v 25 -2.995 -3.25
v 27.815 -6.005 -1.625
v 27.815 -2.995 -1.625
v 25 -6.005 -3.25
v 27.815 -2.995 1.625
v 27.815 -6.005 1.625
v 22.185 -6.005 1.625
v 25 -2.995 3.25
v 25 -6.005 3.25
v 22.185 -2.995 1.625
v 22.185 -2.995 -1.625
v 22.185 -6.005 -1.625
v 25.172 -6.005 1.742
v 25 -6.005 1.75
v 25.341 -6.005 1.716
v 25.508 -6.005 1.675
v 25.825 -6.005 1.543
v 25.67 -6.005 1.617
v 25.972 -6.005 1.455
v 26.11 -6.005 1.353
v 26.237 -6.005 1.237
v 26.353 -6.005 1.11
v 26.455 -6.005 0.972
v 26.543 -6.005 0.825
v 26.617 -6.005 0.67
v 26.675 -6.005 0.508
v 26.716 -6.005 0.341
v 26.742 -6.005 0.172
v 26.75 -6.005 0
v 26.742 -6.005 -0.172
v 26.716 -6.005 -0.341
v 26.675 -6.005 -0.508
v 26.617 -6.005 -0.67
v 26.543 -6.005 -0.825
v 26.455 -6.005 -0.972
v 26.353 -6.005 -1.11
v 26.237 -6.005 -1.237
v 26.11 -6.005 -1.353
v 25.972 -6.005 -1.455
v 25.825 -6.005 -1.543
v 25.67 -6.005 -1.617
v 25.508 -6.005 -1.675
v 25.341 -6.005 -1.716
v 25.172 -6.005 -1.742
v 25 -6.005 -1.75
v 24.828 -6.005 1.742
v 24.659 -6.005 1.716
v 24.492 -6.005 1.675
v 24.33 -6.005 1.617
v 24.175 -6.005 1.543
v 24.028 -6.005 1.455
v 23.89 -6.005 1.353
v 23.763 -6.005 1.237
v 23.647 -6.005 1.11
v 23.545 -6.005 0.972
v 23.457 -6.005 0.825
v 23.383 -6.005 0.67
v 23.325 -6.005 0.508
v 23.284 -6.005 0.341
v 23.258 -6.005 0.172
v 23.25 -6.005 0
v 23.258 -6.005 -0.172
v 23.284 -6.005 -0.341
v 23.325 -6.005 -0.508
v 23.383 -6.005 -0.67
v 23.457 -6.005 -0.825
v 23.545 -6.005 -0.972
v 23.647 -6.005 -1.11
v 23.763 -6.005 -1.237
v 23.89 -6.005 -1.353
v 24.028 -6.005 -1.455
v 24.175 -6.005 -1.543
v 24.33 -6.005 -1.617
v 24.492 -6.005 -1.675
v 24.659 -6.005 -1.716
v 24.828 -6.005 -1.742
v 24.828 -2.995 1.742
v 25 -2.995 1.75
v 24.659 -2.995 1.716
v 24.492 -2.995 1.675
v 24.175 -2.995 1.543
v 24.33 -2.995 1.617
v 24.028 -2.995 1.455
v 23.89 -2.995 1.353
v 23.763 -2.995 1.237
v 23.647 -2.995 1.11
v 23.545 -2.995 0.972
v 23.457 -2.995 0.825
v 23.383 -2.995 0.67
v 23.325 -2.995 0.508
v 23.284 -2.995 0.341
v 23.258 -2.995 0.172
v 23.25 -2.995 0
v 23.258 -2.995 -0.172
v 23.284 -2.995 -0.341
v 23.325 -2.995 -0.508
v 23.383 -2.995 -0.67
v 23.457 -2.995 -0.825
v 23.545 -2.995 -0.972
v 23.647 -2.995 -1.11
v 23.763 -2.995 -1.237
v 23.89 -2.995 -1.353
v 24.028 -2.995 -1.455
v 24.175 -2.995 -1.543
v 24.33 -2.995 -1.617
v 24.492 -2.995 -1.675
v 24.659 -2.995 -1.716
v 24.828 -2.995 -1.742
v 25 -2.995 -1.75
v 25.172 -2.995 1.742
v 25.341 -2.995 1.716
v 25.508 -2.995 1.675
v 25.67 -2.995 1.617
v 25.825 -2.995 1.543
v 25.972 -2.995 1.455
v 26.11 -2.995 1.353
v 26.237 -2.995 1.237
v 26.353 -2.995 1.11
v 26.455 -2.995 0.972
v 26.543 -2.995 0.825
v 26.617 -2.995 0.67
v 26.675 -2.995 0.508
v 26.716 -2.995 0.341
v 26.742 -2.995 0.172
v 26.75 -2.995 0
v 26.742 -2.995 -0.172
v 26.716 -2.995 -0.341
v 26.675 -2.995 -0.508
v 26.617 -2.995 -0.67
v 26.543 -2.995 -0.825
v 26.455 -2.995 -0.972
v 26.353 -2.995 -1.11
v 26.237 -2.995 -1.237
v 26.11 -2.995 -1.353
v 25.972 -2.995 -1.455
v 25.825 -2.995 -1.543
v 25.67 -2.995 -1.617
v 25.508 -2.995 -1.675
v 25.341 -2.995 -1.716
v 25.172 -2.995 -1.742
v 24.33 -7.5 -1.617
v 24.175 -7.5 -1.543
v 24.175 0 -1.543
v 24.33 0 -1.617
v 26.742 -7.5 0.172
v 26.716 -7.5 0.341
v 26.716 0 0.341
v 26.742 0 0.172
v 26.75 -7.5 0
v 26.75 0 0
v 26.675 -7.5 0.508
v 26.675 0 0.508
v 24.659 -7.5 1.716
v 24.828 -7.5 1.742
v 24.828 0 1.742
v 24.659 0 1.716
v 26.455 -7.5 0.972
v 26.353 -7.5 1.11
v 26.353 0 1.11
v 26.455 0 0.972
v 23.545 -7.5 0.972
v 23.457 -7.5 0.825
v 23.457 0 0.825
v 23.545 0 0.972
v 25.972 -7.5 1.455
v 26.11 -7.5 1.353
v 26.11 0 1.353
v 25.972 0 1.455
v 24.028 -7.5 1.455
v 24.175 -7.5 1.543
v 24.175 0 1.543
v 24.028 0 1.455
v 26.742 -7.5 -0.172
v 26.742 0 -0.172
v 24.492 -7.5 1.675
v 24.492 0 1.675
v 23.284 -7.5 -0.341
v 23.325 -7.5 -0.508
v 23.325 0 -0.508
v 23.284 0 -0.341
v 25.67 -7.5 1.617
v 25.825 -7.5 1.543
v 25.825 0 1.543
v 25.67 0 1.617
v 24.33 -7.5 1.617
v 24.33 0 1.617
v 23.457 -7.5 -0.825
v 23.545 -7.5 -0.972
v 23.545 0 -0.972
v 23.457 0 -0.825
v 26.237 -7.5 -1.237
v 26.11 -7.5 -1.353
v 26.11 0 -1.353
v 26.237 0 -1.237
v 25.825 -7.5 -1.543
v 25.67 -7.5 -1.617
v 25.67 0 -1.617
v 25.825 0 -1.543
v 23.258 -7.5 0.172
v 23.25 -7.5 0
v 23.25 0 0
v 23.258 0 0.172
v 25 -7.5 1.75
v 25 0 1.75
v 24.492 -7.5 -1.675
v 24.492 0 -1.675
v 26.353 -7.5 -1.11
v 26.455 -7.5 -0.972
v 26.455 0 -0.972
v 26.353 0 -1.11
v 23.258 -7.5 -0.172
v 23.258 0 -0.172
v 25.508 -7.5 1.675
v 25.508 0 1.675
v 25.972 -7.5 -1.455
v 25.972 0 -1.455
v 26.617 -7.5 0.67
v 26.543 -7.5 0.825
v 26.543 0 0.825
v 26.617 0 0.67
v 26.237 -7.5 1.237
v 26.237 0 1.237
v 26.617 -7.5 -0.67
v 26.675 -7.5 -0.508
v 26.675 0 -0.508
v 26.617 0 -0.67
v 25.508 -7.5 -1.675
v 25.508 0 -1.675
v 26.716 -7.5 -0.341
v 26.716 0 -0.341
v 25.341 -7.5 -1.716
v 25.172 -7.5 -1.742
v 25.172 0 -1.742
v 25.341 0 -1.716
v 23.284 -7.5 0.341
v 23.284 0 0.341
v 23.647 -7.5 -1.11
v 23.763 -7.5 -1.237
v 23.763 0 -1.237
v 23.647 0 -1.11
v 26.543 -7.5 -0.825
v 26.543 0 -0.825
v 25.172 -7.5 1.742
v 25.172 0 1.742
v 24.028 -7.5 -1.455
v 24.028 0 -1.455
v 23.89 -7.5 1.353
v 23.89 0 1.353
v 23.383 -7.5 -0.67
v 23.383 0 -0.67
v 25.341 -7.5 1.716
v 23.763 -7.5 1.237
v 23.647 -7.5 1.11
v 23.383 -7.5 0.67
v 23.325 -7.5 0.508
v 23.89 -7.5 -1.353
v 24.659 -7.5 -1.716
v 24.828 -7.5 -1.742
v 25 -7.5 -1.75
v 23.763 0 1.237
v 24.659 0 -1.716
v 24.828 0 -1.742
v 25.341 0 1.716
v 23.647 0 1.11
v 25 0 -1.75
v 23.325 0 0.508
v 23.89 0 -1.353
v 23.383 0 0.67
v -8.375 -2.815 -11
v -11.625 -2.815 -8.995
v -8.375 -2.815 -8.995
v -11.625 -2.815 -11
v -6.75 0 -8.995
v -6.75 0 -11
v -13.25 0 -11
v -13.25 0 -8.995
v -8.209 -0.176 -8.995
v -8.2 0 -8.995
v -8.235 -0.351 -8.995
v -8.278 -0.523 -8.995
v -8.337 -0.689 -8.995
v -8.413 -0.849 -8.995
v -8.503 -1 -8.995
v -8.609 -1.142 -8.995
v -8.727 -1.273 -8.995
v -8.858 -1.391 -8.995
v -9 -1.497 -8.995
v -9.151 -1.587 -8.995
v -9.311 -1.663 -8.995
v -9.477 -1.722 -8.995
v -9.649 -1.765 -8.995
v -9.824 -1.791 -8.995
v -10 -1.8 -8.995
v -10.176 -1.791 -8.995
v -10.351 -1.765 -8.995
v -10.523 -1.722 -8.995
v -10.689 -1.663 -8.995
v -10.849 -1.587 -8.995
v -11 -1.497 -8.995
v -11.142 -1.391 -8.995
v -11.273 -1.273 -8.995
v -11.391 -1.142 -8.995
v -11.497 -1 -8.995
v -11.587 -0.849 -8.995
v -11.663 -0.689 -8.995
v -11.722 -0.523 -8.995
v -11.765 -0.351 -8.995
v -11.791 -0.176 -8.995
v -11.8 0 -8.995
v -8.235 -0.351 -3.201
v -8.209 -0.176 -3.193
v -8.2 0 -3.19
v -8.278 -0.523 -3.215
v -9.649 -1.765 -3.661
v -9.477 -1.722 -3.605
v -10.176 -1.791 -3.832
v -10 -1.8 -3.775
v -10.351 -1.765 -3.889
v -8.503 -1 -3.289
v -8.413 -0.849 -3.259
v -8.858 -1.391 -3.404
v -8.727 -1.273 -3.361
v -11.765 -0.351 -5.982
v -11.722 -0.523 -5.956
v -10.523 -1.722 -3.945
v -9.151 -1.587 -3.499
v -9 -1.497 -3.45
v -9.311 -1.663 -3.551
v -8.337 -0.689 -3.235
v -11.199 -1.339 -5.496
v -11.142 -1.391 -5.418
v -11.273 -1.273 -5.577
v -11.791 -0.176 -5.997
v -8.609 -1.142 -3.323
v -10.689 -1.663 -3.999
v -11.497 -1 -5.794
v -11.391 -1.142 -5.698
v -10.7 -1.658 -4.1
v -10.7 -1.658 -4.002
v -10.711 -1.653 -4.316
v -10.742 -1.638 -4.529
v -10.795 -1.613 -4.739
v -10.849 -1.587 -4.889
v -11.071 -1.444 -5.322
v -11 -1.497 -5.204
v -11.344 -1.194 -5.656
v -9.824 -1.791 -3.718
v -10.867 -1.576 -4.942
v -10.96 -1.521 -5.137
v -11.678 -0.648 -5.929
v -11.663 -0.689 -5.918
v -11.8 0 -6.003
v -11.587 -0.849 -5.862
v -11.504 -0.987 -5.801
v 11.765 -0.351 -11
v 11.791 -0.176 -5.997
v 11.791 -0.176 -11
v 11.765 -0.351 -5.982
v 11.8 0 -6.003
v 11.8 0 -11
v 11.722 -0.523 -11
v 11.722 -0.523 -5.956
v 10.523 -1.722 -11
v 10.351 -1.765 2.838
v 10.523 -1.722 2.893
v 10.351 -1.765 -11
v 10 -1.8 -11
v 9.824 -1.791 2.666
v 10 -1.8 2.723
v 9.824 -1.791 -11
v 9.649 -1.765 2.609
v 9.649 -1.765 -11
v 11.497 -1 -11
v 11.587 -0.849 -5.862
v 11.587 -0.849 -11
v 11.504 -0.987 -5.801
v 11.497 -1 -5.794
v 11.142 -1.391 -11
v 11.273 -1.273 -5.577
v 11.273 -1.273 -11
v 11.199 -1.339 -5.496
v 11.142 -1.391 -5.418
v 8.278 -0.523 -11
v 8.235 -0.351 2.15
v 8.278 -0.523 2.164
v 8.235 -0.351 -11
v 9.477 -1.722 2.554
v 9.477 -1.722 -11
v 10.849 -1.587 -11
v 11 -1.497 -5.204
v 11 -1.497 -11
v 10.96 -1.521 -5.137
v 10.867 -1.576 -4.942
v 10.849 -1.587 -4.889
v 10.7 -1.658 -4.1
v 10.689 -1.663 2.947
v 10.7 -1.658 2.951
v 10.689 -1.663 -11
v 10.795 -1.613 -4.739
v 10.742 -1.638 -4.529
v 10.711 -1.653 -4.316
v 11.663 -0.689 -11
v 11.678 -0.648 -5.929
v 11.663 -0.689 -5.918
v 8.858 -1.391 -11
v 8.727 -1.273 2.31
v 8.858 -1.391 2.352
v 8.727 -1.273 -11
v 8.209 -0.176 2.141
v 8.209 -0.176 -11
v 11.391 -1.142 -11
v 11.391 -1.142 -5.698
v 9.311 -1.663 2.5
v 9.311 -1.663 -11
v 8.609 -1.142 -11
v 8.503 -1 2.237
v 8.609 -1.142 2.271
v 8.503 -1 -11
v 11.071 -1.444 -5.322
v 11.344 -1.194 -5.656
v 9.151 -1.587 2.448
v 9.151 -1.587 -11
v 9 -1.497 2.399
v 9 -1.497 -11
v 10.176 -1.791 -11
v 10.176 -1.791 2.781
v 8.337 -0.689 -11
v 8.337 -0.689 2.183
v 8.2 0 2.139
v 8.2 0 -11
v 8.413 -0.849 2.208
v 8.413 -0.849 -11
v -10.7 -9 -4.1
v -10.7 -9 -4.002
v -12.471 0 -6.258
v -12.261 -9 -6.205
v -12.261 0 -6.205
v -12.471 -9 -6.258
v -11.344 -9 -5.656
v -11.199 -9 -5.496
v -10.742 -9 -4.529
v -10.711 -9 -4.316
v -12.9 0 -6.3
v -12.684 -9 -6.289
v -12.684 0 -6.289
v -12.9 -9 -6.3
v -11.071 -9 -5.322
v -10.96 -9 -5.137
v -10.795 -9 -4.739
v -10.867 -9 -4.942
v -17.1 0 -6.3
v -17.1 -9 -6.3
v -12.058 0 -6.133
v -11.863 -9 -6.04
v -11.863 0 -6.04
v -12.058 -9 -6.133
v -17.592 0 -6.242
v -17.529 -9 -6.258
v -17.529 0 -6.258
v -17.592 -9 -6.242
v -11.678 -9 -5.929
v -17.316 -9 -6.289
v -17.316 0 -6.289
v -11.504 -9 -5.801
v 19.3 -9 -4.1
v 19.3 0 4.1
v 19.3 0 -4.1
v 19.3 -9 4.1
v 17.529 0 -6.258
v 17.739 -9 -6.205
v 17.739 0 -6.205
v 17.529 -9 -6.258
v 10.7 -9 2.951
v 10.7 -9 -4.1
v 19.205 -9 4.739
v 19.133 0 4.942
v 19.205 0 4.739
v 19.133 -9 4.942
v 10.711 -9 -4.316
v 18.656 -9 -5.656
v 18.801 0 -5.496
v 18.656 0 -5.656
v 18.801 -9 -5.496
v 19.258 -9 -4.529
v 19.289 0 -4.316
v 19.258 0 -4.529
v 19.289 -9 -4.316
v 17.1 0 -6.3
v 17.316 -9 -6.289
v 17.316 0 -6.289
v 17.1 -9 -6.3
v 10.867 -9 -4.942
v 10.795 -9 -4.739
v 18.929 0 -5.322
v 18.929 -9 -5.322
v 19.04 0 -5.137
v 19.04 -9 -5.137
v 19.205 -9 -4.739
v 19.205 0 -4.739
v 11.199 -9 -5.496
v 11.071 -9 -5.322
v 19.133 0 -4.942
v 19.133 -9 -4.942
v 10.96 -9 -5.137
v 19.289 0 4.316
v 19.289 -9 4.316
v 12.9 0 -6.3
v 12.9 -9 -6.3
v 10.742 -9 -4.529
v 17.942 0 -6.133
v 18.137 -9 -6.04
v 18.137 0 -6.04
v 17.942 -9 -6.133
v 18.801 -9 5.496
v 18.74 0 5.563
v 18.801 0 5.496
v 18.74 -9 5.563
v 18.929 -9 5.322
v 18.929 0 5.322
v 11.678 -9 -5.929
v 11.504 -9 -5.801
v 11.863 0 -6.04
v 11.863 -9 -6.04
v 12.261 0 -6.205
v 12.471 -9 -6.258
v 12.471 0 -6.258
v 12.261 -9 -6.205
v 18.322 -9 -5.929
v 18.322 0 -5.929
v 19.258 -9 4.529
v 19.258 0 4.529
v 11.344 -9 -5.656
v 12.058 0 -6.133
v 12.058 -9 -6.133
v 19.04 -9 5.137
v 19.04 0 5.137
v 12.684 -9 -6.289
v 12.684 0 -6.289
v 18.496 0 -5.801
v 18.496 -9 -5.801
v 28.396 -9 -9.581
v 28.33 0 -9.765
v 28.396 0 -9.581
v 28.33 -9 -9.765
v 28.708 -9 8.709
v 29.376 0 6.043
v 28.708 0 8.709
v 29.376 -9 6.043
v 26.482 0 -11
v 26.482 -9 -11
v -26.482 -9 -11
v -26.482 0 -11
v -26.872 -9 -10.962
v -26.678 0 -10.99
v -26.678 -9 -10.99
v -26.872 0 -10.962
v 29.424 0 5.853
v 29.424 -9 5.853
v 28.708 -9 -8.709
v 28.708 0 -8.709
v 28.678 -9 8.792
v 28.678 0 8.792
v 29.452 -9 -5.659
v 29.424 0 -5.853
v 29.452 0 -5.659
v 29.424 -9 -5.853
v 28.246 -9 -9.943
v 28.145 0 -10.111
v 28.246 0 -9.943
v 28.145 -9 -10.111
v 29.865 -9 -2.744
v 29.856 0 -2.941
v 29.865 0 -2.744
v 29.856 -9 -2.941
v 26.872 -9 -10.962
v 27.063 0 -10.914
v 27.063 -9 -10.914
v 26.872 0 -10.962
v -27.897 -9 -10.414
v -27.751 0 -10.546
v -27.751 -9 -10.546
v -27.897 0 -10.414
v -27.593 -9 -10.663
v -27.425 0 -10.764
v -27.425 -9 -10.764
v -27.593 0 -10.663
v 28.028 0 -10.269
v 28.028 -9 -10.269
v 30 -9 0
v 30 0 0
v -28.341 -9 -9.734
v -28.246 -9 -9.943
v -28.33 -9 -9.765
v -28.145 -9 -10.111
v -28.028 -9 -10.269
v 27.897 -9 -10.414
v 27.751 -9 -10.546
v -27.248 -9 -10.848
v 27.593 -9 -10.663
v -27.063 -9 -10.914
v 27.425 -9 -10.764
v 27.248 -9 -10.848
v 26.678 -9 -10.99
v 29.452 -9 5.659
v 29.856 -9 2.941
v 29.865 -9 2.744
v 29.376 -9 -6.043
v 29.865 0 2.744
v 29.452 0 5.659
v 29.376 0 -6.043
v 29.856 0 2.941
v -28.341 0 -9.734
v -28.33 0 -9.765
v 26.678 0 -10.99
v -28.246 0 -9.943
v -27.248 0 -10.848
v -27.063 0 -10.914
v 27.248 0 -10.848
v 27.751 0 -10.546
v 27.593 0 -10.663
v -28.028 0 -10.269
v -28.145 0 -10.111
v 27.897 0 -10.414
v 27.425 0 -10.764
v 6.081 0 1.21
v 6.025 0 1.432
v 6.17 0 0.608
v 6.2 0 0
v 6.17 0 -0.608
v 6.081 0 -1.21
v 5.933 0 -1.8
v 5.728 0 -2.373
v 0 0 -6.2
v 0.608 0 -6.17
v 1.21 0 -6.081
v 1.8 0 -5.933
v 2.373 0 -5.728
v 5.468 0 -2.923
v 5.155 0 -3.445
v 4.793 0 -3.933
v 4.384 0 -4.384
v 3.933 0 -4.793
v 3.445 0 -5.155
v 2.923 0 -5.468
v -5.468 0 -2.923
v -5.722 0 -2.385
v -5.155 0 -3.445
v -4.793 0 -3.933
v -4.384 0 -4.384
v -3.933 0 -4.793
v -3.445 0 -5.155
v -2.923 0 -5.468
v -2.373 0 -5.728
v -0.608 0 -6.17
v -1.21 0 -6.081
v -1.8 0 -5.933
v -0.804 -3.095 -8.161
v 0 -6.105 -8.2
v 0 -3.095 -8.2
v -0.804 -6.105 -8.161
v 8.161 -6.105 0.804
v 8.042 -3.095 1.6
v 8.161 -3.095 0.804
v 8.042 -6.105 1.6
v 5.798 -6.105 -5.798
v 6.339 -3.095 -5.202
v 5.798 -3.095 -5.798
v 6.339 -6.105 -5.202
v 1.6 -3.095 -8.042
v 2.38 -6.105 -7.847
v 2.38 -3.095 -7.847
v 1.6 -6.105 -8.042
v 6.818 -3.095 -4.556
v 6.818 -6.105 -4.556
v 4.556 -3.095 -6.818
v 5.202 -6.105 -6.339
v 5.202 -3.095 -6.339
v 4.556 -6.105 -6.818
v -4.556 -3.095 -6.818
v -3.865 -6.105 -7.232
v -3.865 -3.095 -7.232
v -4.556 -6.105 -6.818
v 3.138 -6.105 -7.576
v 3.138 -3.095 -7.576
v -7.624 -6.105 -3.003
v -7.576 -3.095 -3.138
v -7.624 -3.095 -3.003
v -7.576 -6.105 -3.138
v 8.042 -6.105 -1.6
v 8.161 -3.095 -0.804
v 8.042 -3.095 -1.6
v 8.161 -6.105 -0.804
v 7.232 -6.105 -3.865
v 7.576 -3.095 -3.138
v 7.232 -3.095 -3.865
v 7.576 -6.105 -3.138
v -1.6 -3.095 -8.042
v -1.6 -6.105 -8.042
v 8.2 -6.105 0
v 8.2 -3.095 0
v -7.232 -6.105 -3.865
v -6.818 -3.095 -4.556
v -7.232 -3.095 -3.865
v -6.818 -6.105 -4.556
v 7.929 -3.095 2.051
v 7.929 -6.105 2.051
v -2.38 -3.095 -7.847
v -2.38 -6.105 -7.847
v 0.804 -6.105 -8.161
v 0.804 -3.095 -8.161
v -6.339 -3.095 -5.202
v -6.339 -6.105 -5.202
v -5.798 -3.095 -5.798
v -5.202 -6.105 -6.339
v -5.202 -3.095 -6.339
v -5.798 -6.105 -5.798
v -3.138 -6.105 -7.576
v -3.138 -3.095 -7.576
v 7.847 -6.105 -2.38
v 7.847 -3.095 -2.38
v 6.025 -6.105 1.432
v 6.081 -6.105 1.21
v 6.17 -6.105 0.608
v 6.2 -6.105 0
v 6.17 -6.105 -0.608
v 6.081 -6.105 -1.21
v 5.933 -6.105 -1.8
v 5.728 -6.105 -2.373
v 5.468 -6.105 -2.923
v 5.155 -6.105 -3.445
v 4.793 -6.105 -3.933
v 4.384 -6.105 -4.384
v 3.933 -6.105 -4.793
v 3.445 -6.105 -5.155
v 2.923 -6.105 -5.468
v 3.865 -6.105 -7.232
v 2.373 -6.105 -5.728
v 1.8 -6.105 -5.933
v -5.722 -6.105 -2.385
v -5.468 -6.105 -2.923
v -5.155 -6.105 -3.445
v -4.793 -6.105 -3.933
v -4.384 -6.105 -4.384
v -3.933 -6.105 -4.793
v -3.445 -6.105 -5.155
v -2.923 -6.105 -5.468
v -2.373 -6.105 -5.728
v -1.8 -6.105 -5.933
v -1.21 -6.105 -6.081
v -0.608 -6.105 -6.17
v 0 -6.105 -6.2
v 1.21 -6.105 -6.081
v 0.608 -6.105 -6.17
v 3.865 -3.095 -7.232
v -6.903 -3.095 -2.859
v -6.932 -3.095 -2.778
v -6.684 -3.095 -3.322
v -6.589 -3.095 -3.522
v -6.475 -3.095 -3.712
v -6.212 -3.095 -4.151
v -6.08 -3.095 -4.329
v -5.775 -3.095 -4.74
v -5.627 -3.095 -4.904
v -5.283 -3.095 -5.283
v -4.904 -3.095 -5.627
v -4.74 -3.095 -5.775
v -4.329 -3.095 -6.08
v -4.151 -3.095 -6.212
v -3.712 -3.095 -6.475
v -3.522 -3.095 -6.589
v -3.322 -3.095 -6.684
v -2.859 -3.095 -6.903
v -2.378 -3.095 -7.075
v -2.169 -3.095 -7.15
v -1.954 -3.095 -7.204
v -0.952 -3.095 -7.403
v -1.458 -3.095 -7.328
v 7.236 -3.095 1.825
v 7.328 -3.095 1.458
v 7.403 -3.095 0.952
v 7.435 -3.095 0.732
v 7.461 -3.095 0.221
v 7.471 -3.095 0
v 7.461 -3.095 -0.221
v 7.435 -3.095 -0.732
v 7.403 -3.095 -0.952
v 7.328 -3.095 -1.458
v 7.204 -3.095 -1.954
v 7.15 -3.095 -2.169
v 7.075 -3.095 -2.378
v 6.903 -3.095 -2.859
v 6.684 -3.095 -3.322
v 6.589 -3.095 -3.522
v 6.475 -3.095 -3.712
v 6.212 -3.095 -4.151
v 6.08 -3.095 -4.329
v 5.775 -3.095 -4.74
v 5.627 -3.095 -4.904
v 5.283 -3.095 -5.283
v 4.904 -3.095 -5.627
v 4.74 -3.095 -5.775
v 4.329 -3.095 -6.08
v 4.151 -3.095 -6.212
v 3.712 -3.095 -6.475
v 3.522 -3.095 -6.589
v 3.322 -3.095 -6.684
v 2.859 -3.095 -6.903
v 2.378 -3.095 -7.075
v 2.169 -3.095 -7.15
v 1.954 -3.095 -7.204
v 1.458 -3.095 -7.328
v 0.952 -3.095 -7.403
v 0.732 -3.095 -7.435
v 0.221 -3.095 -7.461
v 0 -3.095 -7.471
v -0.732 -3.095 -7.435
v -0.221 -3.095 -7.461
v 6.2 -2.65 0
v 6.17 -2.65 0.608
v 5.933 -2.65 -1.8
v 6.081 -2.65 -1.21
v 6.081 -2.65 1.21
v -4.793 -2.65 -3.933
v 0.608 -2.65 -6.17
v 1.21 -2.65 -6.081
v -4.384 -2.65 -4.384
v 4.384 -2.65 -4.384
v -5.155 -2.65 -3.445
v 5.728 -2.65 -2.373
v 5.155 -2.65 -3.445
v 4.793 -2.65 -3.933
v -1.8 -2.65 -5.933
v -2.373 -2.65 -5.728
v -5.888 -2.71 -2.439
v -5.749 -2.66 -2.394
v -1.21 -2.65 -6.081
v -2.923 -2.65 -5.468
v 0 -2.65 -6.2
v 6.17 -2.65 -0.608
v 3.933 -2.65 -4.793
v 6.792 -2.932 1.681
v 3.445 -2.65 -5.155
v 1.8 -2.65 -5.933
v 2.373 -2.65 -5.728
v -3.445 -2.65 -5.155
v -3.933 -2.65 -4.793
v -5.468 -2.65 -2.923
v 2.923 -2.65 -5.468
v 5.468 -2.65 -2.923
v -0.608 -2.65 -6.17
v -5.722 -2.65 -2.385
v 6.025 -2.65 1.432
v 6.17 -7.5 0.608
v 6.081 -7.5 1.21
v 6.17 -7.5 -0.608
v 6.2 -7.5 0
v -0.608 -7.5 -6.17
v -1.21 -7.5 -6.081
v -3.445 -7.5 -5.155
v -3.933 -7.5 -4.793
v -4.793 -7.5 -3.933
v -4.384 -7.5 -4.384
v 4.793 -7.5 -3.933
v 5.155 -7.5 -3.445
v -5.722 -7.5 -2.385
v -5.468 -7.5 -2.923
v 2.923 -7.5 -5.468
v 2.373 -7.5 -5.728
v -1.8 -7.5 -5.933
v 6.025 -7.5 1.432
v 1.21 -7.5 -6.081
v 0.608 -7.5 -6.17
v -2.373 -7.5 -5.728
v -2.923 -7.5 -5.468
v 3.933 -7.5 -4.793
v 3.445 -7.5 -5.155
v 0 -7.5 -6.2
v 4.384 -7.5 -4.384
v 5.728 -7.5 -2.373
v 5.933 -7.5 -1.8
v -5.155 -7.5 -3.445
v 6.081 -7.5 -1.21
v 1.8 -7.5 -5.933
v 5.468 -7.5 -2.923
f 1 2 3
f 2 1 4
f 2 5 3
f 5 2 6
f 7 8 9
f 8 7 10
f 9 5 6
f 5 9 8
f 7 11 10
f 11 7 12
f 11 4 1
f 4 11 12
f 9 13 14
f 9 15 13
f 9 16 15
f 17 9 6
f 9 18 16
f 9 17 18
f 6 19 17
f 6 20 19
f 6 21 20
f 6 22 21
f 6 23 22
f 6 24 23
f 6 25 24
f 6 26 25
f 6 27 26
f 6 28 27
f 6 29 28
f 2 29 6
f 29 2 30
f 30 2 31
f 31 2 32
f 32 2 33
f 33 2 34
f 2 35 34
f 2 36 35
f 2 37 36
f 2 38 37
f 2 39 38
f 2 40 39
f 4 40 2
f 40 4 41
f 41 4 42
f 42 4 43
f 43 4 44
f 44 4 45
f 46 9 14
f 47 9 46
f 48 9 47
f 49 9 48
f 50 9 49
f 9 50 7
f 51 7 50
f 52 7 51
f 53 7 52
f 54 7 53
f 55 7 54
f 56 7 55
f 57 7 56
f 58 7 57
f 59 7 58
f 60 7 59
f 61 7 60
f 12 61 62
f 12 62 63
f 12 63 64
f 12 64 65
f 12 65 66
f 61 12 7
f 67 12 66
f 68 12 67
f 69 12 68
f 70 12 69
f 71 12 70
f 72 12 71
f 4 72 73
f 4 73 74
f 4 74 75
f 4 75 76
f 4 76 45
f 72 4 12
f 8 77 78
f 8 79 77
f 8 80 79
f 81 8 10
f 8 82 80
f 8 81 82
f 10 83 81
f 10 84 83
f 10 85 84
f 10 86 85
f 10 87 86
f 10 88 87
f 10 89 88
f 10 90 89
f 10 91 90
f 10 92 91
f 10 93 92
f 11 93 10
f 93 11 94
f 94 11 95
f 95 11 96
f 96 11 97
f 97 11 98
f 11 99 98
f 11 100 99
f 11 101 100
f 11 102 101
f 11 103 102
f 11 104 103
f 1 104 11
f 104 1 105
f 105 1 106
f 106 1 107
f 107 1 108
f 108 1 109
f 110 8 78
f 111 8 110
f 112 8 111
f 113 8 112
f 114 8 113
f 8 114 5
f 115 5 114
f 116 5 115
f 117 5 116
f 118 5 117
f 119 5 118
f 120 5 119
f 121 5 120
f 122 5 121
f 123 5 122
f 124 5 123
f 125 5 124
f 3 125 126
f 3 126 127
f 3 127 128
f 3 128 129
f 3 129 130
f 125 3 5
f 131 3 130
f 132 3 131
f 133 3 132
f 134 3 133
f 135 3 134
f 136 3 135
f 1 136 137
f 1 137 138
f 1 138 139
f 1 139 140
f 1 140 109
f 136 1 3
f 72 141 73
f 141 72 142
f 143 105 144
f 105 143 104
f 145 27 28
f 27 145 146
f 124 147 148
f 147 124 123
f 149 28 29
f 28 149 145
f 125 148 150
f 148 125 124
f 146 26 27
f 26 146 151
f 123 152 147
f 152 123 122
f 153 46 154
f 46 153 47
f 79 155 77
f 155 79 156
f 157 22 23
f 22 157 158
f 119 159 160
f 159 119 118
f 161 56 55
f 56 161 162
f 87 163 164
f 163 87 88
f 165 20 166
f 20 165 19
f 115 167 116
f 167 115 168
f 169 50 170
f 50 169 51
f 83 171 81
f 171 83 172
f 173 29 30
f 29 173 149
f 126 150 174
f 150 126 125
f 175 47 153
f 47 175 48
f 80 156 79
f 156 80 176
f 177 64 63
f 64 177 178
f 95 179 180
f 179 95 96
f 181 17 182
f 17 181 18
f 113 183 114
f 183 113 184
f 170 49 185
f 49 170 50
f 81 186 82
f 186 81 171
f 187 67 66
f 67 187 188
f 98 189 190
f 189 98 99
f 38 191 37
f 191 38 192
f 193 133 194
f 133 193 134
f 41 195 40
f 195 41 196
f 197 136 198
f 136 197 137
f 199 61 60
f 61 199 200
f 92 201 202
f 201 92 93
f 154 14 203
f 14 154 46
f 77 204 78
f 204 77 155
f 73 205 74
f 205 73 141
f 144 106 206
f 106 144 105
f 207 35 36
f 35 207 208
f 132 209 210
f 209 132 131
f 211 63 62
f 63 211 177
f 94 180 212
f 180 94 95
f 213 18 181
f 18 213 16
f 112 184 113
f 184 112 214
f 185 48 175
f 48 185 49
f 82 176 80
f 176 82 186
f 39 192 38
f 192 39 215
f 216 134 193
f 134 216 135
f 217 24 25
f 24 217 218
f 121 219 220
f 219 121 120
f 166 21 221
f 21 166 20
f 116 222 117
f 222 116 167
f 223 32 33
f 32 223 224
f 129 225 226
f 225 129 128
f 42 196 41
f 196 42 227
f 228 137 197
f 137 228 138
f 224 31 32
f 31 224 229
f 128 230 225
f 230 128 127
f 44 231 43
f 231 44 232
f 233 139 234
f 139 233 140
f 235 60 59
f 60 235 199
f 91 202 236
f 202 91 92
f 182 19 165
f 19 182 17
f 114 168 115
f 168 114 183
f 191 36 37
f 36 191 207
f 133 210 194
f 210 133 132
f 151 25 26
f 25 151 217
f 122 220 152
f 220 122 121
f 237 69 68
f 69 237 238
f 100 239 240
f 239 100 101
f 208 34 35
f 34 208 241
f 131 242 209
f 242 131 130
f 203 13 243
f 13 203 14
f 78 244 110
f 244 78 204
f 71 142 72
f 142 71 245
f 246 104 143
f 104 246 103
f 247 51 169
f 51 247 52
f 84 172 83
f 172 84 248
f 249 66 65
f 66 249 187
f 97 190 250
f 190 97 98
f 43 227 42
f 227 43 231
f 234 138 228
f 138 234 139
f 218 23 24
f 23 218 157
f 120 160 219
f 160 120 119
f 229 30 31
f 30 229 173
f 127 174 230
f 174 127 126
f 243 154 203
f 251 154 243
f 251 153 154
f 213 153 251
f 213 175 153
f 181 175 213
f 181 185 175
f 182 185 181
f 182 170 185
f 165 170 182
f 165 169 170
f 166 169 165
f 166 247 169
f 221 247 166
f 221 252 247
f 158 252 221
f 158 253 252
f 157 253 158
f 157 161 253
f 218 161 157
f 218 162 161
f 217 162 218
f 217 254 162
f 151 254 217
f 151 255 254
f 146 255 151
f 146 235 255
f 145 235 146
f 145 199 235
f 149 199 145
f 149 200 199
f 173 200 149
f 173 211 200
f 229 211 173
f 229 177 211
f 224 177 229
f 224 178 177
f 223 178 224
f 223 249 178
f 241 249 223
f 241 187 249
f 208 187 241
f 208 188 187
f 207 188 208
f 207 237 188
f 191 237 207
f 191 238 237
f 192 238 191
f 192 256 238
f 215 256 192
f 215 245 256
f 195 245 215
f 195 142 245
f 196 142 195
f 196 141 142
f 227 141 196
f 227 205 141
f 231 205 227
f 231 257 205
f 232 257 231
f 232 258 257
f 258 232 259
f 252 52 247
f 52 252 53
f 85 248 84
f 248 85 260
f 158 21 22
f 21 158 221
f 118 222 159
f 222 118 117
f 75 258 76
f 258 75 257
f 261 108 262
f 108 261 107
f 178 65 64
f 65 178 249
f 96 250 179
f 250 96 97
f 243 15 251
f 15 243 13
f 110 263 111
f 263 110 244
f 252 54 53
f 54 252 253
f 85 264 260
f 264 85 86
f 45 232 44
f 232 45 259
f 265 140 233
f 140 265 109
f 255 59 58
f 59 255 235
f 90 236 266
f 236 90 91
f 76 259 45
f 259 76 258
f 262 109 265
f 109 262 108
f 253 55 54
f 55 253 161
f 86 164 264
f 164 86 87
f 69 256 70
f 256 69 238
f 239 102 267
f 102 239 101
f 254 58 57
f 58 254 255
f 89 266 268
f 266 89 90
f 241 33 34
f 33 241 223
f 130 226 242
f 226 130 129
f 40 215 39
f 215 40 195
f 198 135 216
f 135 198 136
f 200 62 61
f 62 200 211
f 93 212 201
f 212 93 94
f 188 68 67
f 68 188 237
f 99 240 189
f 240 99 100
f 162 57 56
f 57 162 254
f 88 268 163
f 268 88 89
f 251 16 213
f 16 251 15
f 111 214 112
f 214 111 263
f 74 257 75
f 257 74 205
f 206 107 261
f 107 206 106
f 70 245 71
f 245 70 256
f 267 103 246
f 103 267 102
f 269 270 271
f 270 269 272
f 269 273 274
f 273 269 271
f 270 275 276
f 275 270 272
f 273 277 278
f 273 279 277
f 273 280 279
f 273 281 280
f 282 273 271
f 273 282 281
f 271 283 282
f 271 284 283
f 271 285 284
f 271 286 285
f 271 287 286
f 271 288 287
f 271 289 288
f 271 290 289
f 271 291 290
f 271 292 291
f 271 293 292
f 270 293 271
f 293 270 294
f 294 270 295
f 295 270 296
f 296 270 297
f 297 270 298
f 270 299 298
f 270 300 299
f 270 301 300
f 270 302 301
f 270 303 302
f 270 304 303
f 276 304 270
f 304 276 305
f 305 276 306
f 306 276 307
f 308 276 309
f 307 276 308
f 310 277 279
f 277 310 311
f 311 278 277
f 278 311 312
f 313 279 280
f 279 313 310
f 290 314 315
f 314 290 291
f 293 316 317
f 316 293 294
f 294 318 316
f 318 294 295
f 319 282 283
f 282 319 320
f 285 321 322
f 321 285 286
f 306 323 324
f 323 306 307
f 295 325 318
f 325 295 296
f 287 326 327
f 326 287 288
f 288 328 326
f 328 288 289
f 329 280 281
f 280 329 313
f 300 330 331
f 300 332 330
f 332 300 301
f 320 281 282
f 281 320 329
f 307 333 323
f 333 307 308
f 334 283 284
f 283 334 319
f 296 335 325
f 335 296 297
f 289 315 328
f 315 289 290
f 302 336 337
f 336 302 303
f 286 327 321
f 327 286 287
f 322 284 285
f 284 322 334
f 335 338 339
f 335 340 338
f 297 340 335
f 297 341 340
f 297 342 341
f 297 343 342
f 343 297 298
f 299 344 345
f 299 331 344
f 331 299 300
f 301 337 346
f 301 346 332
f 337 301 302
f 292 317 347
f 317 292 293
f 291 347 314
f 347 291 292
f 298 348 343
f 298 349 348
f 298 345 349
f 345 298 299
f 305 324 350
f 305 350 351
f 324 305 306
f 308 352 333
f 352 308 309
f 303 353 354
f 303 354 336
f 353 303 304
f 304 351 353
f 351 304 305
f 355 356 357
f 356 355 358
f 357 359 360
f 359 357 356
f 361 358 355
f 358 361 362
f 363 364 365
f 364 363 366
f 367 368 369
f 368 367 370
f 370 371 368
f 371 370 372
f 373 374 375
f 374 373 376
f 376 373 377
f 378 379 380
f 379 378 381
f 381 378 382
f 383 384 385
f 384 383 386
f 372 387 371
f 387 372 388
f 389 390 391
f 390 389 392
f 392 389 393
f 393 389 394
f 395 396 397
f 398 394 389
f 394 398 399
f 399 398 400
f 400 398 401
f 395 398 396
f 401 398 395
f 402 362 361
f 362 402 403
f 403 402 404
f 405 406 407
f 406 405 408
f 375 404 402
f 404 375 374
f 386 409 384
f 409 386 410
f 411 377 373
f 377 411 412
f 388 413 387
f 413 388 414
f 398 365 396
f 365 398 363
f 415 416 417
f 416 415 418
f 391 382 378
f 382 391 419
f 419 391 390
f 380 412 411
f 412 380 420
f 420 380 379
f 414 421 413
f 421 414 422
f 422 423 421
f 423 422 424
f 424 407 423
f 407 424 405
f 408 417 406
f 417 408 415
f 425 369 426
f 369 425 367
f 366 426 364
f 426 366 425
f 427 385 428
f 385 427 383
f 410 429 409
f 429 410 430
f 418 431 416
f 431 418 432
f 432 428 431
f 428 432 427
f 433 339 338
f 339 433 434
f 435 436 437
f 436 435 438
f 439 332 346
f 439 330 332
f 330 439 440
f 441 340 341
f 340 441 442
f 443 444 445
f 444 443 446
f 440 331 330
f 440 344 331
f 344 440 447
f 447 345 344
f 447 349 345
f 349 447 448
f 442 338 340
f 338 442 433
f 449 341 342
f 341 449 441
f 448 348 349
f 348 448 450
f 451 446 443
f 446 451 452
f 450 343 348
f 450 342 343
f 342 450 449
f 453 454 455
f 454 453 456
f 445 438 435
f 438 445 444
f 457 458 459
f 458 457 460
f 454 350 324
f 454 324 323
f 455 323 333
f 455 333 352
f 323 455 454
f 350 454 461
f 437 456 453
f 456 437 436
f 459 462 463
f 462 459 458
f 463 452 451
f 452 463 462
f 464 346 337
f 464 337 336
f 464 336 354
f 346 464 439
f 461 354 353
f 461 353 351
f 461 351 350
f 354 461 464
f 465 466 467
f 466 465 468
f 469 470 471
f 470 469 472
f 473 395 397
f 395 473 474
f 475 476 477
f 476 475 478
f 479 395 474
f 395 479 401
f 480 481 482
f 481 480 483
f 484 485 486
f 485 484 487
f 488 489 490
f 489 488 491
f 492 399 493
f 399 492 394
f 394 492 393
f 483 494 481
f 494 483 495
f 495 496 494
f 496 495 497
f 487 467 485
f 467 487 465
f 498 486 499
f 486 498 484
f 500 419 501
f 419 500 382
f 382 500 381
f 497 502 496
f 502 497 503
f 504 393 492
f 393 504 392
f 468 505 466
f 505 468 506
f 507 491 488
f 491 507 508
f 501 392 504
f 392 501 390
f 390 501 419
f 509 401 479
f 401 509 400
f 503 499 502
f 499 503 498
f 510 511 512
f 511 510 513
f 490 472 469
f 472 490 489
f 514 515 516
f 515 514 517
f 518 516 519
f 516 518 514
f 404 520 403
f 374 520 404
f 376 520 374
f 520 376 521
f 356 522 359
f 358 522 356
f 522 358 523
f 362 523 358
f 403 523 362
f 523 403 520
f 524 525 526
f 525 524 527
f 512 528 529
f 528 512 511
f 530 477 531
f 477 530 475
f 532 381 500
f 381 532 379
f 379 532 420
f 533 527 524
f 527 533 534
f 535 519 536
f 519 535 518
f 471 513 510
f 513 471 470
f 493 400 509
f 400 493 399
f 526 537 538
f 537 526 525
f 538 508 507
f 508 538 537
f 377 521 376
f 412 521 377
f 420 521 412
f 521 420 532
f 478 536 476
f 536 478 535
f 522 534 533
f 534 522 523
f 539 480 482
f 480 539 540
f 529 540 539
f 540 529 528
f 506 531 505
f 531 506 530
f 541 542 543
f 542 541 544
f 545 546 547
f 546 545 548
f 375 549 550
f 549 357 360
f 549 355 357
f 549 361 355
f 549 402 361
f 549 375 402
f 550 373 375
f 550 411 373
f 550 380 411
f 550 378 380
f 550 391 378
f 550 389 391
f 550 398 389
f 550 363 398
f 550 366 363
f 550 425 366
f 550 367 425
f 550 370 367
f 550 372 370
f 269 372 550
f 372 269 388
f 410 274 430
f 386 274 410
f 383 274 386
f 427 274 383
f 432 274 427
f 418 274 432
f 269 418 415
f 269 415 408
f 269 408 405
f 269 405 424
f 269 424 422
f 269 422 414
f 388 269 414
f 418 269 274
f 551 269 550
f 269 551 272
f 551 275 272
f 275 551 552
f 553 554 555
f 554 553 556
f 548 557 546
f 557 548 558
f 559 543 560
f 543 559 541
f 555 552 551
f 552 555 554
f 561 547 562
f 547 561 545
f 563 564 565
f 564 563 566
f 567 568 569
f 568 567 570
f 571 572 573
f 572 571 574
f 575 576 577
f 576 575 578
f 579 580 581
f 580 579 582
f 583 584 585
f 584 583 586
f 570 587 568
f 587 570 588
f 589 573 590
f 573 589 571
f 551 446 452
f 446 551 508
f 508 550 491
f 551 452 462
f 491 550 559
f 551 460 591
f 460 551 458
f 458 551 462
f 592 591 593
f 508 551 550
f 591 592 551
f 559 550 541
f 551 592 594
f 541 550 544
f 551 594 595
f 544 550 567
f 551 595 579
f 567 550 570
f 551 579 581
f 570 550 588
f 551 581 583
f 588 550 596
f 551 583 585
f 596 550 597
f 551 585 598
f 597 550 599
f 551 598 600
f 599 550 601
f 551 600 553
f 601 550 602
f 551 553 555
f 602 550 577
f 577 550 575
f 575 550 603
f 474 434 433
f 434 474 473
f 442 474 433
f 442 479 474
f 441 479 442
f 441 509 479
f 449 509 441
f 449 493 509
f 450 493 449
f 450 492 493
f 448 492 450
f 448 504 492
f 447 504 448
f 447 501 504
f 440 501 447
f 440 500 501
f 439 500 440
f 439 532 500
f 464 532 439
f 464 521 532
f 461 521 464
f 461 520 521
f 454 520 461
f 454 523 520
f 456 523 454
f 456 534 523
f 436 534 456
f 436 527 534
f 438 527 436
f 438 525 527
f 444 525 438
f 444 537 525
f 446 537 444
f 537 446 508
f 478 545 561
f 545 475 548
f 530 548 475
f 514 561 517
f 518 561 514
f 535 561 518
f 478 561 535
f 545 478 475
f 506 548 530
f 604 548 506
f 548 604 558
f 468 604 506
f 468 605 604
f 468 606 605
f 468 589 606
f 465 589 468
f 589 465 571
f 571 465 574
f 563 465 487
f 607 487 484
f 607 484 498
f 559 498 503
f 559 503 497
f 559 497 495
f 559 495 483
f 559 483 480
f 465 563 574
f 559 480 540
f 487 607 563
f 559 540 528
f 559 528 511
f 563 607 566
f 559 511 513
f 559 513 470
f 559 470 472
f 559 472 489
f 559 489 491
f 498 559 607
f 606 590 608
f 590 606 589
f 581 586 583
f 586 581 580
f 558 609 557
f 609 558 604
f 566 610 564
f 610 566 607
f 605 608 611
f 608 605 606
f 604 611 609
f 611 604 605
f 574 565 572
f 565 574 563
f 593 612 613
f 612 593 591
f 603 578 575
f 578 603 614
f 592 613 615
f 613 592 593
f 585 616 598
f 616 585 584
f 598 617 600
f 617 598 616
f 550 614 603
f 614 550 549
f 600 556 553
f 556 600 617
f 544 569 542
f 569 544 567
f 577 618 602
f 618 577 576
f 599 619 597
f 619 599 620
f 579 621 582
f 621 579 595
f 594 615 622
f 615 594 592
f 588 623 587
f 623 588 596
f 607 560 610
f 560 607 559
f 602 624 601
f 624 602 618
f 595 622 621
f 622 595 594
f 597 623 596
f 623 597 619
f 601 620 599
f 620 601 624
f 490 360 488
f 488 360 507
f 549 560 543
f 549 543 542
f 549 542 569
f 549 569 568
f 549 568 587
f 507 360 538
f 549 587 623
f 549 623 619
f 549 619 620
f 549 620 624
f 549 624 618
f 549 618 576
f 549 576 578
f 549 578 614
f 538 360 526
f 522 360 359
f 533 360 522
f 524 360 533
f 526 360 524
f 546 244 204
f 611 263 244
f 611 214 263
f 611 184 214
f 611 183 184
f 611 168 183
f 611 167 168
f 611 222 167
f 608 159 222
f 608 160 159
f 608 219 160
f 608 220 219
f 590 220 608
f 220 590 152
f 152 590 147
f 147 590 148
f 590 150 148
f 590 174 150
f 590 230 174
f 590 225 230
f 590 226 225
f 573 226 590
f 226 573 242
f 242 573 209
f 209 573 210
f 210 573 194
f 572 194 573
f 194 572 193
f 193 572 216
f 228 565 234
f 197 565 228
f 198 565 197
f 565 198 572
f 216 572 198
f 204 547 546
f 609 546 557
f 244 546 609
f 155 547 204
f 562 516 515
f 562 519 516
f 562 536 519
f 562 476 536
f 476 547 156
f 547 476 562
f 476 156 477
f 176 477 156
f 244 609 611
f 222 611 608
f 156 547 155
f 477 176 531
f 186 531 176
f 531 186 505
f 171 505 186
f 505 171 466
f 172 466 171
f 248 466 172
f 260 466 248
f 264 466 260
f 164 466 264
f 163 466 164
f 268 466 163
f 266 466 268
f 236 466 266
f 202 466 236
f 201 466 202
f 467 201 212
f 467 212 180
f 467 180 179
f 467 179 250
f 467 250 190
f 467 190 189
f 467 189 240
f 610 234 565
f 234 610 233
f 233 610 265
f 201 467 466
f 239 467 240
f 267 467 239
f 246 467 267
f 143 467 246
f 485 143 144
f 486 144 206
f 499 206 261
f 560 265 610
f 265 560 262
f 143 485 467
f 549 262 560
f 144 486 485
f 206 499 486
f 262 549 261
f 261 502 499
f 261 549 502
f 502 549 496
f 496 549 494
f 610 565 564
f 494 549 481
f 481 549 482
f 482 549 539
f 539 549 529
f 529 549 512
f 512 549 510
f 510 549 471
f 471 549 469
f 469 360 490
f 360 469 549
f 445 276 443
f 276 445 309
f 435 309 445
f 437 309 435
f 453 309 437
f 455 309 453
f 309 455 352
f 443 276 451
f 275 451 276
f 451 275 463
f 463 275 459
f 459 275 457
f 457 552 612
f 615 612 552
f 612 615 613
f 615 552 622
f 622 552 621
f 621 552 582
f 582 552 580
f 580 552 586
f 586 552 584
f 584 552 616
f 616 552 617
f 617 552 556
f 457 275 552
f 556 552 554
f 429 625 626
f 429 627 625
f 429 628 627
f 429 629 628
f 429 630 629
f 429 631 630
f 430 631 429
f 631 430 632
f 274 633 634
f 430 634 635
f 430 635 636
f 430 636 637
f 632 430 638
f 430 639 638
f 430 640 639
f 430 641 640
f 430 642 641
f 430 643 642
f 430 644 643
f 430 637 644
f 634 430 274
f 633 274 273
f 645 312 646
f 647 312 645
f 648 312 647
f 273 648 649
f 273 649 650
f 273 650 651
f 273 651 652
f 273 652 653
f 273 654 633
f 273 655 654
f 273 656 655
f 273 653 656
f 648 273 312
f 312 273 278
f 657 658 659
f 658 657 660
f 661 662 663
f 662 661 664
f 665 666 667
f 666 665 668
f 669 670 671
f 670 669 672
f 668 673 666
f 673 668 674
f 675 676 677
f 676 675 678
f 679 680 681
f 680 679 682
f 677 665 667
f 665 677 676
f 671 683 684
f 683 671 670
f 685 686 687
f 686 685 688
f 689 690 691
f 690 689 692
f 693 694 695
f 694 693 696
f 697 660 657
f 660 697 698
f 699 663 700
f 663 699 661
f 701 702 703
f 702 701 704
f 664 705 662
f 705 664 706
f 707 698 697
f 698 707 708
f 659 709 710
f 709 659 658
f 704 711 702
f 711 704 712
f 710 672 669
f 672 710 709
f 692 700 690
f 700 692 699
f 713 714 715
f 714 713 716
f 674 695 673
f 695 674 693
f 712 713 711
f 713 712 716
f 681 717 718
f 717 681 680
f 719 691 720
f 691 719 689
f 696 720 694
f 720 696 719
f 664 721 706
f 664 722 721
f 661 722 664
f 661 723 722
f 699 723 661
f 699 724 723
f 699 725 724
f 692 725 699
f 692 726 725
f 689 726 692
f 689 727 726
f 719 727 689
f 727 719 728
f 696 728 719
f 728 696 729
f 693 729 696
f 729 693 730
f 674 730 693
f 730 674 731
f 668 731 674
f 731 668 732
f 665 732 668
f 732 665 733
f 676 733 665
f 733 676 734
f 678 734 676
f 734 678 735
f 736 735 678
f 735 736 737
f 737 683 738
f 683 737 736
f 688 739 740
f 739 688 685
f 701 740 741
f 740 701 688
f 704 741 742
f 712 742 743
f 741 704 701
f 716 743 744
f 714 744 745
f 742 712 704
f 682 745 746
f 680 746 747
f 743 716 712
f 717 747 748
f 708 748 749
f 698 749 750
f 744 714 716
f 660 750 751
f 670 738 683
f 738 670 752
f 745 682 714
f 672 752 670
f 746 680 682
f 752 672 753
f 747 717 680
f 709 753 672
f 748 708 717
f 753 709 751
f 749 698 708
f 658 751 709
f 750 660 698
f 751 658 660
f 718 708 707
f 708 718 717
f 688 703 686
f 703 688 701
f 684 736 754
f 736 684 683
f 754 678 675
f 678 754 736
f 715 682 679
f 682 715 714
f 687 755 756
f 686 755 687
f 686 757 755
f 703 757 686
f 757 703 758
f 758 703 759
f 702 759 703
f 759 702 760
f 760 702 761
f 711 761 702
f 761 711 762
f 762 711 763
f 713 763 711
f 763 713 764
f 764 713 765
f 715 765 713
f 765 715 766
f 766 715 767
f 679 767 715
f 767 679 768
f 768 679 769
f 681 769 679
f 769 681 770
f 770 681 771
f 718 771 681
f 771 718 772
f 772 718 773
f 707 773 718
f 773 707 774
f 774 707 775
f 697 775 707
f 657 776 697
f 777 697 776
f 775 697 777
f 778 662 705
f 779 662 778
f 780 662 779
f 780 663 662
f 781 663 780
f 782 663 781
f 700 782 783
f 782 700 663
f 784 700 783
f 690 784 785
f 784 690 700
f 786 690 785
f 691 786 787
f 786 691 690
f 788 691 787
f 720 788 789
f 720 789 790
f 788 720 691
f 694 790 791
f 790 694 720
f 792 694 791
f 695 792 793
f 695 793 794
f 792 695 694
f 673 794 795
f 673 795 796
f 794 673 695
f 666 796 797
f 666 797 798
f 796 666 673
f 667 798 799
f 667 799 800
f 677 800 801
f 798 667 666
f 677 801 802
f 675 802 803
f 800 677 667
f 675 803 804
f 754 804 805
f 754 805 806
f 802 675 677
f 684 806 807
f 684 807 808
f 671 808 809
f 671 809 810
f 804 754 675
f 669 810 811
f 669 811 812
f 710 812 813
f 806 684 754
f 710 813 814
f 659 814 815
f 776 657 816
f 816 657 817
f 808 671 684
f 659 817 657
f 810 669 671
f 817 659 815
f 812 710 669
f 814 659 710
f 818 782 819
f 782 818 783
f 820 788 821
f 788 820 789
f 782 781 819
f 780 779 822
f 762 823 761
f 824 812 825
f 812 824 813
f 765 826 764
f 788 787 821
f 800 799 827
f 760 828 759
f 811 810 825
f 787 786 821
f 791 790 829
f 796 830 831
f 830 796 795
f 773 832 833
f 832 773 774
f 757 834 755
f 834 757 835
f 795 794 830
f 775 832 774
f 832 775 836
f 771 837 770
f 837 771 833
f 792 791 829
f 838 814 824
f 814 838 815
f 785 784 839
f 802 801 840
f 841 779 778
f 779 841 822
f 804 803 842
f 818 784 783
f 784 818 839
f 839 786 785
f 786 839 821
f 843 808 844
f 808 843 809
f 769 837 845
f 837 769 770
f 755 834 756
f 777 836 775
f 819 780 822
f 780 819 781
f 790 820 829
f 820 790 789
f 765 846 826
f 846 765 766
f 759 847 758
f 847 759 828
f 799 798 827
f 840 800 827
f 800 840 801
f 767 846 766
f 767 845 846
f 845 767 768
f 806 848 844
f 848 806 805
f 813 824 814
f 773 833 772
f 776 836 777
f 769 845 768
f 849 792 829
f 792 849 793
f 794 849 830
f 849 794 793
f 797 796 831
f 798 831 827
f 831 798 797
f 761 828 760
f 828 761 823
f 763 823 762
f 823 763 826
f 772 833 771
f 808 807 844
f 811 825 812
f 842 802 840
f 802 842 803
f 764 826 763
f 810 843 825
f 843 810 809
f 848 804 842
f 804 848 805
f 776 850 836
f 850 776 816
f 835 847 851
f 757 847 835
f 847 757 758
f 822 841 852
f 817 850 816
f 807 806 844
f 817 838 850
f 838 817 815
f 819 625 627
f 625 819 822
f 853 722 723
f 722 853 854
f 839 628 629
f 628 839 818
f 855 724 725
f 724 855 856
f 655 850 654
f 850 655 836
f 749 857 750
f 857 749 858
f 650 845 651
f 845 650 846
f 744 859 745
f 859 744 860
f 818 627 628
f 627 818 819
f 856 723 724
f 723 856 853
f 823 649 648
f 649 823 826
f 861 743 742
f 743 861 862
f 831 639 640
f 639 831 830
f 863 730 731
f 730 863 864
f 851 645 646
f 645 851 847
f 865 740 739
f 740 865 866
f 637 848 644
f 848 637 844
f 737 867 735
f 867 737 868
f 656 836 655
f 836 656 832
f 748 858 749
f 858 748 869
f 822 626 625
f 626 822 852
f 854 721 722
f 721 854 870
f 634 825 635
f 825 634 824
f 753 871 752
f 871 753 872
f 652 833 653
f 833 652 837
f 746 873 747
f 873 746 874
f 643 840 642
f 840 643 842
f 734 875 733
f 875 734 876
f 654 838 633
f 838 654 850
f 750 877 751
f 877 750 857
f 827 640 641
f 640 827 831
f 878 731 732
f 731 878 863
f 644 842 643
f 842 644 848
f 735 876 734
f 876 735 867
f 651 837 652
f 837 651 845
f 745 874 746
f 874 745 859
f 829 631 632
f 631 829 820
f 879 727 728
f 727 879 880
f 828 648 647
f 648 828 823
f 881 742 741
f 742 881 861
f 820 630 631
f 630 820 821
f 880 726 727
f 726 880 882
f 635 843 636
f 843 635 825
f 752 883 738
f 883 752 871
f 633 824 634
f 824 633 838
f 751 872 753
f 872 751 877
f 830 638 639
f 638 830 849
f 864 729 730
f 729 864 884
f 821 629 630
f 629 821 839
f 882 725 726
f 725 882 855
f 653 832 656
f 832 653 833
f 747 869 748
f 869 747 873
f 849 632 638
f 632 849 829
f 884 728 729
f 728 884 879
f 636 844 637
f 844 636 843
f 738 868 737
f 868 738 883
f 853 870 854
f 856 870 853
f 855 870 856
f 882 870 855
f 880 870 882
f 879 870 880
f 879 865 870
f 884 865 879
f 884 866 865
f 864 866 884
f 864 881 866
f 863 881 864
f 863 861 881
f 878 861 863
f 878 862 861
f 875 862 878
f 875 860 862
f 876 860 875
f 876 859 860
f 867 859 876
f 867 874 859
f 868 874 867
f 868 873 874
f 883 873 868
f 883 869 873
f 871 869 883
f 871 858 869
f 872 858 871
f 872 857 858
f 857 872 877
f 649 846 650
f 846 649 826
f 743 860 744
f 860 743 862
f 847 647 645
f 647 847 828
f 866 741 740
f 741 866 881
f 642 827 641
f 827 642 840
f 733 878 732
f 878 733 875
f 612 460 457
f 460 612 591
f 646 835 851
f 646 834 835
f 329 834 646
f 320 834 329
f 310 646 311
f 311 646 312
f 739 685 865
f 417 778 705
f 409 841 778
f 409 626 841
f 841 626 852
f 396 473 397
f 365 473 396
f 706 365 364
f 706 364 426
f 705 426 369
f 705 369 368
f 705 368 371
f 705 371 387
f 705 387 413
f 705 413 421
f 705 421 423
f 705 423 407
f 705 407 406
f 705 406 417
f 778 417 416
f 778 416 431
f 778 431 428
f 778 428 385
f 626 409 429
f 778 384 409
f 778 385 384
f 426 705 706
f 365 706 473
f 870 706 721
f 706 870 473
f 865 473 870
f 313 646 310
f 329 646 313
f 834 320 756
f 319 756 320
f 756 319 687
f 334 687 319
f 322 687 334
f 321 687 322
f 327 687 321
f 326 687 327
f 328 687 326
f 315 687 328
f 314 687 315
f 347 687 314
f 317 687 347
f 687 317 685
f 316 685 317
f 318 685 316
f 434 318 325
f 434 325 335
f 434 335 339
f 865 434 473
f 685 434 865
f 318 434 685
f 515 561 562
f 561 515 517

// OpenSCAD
/*
Info:
You need two of these, 180° rotated (see last line) to mount your hotend. It is suitable for (and tested with) E3D-Hotends.

Improvement:
- much more sturdy than old design
- you can put your heater/fan/tempsensor-cable through the cutout

TODO: 
- 

*/

$fn=64;

function signum(x) = (x < 0)?-1:(x > 0)?1:0; 

module bowden_clamp() 
{ 
    difference() 
    {
        translate([0,0,-0]) 
        {
            // basic shape
            minkowski() 
            {
                intersection() 
                {
                    cube([60-2,22-4,12/2],center=true);
                    cylinder(r=30-2,h=12/2);
                }
                cylinder(r=2,h=12/2); // rounded corners
            }
        }
	
        for(x=[-25,25]) 
        {
            // M4 socket heads and mounting holes
            translate([x,0,+4.5]) rotate([0,0,30]) cylinder(d=6.5,h=3.01,center=true, $fn=6);
            translate([x,0,-4.5]) rotate([0,0,30]) cylinder(d=6.5,h=3.01,center=true, $fn=6);
            translate([x,0,0]) cylinder(d=3.5,h=15,center=true);
        }

        for (x=[-10,+10]) 
        {
            translate([x,signum(x)*10.5,0]) rotate([90,0,0]) cylinder(d=6.5,h=3.01,center=true, $fn=6);
            translate([x,0,0]) rotate([90,0,0]) cylinder(d=3.6,h=25,center=true); 
        }

        // groove mount for E3D 
        oW = 16.4; // E3D outer width
        iW = 12.4; // E3D inner width
        translate([0,0,+4.6]) cylinder(d=oW,h=3.01,center=true);
        translate([0,0,-4.6]) cylinder(d=oW,h=3.01,center=true);
        translate([0,0,+3.0]) cylinder(d1=iW,d2=oW,h=0.7,center=true);
        translate([0,0,-3.0]) cylinder(d1=oW,d2=iW,h=0.7,center=true);
        translate([0,0,+0.0]) cylinder(d=iW,h=15,center=true);
    
        // unnecessary vents
        for(x=[-15,15]) translate([x,0,-1]) minkowski() 
        {
            cube([4.2,8.2,13],center=true);
            cylinder(r=2.2,h=13);
        }
        // cut part in half
        rotate([0,0,18]) translate([-50,-0.5,-20]) cube([100,50,55]);
    }
}

// Test-Preview
//rotate([ 0, 0,  0]) bowden_clamp();
//rotate([ 0, 0,180]) bowden_clamp();

// Printable:
rotate([90,0,0]) bowden_clamp();
